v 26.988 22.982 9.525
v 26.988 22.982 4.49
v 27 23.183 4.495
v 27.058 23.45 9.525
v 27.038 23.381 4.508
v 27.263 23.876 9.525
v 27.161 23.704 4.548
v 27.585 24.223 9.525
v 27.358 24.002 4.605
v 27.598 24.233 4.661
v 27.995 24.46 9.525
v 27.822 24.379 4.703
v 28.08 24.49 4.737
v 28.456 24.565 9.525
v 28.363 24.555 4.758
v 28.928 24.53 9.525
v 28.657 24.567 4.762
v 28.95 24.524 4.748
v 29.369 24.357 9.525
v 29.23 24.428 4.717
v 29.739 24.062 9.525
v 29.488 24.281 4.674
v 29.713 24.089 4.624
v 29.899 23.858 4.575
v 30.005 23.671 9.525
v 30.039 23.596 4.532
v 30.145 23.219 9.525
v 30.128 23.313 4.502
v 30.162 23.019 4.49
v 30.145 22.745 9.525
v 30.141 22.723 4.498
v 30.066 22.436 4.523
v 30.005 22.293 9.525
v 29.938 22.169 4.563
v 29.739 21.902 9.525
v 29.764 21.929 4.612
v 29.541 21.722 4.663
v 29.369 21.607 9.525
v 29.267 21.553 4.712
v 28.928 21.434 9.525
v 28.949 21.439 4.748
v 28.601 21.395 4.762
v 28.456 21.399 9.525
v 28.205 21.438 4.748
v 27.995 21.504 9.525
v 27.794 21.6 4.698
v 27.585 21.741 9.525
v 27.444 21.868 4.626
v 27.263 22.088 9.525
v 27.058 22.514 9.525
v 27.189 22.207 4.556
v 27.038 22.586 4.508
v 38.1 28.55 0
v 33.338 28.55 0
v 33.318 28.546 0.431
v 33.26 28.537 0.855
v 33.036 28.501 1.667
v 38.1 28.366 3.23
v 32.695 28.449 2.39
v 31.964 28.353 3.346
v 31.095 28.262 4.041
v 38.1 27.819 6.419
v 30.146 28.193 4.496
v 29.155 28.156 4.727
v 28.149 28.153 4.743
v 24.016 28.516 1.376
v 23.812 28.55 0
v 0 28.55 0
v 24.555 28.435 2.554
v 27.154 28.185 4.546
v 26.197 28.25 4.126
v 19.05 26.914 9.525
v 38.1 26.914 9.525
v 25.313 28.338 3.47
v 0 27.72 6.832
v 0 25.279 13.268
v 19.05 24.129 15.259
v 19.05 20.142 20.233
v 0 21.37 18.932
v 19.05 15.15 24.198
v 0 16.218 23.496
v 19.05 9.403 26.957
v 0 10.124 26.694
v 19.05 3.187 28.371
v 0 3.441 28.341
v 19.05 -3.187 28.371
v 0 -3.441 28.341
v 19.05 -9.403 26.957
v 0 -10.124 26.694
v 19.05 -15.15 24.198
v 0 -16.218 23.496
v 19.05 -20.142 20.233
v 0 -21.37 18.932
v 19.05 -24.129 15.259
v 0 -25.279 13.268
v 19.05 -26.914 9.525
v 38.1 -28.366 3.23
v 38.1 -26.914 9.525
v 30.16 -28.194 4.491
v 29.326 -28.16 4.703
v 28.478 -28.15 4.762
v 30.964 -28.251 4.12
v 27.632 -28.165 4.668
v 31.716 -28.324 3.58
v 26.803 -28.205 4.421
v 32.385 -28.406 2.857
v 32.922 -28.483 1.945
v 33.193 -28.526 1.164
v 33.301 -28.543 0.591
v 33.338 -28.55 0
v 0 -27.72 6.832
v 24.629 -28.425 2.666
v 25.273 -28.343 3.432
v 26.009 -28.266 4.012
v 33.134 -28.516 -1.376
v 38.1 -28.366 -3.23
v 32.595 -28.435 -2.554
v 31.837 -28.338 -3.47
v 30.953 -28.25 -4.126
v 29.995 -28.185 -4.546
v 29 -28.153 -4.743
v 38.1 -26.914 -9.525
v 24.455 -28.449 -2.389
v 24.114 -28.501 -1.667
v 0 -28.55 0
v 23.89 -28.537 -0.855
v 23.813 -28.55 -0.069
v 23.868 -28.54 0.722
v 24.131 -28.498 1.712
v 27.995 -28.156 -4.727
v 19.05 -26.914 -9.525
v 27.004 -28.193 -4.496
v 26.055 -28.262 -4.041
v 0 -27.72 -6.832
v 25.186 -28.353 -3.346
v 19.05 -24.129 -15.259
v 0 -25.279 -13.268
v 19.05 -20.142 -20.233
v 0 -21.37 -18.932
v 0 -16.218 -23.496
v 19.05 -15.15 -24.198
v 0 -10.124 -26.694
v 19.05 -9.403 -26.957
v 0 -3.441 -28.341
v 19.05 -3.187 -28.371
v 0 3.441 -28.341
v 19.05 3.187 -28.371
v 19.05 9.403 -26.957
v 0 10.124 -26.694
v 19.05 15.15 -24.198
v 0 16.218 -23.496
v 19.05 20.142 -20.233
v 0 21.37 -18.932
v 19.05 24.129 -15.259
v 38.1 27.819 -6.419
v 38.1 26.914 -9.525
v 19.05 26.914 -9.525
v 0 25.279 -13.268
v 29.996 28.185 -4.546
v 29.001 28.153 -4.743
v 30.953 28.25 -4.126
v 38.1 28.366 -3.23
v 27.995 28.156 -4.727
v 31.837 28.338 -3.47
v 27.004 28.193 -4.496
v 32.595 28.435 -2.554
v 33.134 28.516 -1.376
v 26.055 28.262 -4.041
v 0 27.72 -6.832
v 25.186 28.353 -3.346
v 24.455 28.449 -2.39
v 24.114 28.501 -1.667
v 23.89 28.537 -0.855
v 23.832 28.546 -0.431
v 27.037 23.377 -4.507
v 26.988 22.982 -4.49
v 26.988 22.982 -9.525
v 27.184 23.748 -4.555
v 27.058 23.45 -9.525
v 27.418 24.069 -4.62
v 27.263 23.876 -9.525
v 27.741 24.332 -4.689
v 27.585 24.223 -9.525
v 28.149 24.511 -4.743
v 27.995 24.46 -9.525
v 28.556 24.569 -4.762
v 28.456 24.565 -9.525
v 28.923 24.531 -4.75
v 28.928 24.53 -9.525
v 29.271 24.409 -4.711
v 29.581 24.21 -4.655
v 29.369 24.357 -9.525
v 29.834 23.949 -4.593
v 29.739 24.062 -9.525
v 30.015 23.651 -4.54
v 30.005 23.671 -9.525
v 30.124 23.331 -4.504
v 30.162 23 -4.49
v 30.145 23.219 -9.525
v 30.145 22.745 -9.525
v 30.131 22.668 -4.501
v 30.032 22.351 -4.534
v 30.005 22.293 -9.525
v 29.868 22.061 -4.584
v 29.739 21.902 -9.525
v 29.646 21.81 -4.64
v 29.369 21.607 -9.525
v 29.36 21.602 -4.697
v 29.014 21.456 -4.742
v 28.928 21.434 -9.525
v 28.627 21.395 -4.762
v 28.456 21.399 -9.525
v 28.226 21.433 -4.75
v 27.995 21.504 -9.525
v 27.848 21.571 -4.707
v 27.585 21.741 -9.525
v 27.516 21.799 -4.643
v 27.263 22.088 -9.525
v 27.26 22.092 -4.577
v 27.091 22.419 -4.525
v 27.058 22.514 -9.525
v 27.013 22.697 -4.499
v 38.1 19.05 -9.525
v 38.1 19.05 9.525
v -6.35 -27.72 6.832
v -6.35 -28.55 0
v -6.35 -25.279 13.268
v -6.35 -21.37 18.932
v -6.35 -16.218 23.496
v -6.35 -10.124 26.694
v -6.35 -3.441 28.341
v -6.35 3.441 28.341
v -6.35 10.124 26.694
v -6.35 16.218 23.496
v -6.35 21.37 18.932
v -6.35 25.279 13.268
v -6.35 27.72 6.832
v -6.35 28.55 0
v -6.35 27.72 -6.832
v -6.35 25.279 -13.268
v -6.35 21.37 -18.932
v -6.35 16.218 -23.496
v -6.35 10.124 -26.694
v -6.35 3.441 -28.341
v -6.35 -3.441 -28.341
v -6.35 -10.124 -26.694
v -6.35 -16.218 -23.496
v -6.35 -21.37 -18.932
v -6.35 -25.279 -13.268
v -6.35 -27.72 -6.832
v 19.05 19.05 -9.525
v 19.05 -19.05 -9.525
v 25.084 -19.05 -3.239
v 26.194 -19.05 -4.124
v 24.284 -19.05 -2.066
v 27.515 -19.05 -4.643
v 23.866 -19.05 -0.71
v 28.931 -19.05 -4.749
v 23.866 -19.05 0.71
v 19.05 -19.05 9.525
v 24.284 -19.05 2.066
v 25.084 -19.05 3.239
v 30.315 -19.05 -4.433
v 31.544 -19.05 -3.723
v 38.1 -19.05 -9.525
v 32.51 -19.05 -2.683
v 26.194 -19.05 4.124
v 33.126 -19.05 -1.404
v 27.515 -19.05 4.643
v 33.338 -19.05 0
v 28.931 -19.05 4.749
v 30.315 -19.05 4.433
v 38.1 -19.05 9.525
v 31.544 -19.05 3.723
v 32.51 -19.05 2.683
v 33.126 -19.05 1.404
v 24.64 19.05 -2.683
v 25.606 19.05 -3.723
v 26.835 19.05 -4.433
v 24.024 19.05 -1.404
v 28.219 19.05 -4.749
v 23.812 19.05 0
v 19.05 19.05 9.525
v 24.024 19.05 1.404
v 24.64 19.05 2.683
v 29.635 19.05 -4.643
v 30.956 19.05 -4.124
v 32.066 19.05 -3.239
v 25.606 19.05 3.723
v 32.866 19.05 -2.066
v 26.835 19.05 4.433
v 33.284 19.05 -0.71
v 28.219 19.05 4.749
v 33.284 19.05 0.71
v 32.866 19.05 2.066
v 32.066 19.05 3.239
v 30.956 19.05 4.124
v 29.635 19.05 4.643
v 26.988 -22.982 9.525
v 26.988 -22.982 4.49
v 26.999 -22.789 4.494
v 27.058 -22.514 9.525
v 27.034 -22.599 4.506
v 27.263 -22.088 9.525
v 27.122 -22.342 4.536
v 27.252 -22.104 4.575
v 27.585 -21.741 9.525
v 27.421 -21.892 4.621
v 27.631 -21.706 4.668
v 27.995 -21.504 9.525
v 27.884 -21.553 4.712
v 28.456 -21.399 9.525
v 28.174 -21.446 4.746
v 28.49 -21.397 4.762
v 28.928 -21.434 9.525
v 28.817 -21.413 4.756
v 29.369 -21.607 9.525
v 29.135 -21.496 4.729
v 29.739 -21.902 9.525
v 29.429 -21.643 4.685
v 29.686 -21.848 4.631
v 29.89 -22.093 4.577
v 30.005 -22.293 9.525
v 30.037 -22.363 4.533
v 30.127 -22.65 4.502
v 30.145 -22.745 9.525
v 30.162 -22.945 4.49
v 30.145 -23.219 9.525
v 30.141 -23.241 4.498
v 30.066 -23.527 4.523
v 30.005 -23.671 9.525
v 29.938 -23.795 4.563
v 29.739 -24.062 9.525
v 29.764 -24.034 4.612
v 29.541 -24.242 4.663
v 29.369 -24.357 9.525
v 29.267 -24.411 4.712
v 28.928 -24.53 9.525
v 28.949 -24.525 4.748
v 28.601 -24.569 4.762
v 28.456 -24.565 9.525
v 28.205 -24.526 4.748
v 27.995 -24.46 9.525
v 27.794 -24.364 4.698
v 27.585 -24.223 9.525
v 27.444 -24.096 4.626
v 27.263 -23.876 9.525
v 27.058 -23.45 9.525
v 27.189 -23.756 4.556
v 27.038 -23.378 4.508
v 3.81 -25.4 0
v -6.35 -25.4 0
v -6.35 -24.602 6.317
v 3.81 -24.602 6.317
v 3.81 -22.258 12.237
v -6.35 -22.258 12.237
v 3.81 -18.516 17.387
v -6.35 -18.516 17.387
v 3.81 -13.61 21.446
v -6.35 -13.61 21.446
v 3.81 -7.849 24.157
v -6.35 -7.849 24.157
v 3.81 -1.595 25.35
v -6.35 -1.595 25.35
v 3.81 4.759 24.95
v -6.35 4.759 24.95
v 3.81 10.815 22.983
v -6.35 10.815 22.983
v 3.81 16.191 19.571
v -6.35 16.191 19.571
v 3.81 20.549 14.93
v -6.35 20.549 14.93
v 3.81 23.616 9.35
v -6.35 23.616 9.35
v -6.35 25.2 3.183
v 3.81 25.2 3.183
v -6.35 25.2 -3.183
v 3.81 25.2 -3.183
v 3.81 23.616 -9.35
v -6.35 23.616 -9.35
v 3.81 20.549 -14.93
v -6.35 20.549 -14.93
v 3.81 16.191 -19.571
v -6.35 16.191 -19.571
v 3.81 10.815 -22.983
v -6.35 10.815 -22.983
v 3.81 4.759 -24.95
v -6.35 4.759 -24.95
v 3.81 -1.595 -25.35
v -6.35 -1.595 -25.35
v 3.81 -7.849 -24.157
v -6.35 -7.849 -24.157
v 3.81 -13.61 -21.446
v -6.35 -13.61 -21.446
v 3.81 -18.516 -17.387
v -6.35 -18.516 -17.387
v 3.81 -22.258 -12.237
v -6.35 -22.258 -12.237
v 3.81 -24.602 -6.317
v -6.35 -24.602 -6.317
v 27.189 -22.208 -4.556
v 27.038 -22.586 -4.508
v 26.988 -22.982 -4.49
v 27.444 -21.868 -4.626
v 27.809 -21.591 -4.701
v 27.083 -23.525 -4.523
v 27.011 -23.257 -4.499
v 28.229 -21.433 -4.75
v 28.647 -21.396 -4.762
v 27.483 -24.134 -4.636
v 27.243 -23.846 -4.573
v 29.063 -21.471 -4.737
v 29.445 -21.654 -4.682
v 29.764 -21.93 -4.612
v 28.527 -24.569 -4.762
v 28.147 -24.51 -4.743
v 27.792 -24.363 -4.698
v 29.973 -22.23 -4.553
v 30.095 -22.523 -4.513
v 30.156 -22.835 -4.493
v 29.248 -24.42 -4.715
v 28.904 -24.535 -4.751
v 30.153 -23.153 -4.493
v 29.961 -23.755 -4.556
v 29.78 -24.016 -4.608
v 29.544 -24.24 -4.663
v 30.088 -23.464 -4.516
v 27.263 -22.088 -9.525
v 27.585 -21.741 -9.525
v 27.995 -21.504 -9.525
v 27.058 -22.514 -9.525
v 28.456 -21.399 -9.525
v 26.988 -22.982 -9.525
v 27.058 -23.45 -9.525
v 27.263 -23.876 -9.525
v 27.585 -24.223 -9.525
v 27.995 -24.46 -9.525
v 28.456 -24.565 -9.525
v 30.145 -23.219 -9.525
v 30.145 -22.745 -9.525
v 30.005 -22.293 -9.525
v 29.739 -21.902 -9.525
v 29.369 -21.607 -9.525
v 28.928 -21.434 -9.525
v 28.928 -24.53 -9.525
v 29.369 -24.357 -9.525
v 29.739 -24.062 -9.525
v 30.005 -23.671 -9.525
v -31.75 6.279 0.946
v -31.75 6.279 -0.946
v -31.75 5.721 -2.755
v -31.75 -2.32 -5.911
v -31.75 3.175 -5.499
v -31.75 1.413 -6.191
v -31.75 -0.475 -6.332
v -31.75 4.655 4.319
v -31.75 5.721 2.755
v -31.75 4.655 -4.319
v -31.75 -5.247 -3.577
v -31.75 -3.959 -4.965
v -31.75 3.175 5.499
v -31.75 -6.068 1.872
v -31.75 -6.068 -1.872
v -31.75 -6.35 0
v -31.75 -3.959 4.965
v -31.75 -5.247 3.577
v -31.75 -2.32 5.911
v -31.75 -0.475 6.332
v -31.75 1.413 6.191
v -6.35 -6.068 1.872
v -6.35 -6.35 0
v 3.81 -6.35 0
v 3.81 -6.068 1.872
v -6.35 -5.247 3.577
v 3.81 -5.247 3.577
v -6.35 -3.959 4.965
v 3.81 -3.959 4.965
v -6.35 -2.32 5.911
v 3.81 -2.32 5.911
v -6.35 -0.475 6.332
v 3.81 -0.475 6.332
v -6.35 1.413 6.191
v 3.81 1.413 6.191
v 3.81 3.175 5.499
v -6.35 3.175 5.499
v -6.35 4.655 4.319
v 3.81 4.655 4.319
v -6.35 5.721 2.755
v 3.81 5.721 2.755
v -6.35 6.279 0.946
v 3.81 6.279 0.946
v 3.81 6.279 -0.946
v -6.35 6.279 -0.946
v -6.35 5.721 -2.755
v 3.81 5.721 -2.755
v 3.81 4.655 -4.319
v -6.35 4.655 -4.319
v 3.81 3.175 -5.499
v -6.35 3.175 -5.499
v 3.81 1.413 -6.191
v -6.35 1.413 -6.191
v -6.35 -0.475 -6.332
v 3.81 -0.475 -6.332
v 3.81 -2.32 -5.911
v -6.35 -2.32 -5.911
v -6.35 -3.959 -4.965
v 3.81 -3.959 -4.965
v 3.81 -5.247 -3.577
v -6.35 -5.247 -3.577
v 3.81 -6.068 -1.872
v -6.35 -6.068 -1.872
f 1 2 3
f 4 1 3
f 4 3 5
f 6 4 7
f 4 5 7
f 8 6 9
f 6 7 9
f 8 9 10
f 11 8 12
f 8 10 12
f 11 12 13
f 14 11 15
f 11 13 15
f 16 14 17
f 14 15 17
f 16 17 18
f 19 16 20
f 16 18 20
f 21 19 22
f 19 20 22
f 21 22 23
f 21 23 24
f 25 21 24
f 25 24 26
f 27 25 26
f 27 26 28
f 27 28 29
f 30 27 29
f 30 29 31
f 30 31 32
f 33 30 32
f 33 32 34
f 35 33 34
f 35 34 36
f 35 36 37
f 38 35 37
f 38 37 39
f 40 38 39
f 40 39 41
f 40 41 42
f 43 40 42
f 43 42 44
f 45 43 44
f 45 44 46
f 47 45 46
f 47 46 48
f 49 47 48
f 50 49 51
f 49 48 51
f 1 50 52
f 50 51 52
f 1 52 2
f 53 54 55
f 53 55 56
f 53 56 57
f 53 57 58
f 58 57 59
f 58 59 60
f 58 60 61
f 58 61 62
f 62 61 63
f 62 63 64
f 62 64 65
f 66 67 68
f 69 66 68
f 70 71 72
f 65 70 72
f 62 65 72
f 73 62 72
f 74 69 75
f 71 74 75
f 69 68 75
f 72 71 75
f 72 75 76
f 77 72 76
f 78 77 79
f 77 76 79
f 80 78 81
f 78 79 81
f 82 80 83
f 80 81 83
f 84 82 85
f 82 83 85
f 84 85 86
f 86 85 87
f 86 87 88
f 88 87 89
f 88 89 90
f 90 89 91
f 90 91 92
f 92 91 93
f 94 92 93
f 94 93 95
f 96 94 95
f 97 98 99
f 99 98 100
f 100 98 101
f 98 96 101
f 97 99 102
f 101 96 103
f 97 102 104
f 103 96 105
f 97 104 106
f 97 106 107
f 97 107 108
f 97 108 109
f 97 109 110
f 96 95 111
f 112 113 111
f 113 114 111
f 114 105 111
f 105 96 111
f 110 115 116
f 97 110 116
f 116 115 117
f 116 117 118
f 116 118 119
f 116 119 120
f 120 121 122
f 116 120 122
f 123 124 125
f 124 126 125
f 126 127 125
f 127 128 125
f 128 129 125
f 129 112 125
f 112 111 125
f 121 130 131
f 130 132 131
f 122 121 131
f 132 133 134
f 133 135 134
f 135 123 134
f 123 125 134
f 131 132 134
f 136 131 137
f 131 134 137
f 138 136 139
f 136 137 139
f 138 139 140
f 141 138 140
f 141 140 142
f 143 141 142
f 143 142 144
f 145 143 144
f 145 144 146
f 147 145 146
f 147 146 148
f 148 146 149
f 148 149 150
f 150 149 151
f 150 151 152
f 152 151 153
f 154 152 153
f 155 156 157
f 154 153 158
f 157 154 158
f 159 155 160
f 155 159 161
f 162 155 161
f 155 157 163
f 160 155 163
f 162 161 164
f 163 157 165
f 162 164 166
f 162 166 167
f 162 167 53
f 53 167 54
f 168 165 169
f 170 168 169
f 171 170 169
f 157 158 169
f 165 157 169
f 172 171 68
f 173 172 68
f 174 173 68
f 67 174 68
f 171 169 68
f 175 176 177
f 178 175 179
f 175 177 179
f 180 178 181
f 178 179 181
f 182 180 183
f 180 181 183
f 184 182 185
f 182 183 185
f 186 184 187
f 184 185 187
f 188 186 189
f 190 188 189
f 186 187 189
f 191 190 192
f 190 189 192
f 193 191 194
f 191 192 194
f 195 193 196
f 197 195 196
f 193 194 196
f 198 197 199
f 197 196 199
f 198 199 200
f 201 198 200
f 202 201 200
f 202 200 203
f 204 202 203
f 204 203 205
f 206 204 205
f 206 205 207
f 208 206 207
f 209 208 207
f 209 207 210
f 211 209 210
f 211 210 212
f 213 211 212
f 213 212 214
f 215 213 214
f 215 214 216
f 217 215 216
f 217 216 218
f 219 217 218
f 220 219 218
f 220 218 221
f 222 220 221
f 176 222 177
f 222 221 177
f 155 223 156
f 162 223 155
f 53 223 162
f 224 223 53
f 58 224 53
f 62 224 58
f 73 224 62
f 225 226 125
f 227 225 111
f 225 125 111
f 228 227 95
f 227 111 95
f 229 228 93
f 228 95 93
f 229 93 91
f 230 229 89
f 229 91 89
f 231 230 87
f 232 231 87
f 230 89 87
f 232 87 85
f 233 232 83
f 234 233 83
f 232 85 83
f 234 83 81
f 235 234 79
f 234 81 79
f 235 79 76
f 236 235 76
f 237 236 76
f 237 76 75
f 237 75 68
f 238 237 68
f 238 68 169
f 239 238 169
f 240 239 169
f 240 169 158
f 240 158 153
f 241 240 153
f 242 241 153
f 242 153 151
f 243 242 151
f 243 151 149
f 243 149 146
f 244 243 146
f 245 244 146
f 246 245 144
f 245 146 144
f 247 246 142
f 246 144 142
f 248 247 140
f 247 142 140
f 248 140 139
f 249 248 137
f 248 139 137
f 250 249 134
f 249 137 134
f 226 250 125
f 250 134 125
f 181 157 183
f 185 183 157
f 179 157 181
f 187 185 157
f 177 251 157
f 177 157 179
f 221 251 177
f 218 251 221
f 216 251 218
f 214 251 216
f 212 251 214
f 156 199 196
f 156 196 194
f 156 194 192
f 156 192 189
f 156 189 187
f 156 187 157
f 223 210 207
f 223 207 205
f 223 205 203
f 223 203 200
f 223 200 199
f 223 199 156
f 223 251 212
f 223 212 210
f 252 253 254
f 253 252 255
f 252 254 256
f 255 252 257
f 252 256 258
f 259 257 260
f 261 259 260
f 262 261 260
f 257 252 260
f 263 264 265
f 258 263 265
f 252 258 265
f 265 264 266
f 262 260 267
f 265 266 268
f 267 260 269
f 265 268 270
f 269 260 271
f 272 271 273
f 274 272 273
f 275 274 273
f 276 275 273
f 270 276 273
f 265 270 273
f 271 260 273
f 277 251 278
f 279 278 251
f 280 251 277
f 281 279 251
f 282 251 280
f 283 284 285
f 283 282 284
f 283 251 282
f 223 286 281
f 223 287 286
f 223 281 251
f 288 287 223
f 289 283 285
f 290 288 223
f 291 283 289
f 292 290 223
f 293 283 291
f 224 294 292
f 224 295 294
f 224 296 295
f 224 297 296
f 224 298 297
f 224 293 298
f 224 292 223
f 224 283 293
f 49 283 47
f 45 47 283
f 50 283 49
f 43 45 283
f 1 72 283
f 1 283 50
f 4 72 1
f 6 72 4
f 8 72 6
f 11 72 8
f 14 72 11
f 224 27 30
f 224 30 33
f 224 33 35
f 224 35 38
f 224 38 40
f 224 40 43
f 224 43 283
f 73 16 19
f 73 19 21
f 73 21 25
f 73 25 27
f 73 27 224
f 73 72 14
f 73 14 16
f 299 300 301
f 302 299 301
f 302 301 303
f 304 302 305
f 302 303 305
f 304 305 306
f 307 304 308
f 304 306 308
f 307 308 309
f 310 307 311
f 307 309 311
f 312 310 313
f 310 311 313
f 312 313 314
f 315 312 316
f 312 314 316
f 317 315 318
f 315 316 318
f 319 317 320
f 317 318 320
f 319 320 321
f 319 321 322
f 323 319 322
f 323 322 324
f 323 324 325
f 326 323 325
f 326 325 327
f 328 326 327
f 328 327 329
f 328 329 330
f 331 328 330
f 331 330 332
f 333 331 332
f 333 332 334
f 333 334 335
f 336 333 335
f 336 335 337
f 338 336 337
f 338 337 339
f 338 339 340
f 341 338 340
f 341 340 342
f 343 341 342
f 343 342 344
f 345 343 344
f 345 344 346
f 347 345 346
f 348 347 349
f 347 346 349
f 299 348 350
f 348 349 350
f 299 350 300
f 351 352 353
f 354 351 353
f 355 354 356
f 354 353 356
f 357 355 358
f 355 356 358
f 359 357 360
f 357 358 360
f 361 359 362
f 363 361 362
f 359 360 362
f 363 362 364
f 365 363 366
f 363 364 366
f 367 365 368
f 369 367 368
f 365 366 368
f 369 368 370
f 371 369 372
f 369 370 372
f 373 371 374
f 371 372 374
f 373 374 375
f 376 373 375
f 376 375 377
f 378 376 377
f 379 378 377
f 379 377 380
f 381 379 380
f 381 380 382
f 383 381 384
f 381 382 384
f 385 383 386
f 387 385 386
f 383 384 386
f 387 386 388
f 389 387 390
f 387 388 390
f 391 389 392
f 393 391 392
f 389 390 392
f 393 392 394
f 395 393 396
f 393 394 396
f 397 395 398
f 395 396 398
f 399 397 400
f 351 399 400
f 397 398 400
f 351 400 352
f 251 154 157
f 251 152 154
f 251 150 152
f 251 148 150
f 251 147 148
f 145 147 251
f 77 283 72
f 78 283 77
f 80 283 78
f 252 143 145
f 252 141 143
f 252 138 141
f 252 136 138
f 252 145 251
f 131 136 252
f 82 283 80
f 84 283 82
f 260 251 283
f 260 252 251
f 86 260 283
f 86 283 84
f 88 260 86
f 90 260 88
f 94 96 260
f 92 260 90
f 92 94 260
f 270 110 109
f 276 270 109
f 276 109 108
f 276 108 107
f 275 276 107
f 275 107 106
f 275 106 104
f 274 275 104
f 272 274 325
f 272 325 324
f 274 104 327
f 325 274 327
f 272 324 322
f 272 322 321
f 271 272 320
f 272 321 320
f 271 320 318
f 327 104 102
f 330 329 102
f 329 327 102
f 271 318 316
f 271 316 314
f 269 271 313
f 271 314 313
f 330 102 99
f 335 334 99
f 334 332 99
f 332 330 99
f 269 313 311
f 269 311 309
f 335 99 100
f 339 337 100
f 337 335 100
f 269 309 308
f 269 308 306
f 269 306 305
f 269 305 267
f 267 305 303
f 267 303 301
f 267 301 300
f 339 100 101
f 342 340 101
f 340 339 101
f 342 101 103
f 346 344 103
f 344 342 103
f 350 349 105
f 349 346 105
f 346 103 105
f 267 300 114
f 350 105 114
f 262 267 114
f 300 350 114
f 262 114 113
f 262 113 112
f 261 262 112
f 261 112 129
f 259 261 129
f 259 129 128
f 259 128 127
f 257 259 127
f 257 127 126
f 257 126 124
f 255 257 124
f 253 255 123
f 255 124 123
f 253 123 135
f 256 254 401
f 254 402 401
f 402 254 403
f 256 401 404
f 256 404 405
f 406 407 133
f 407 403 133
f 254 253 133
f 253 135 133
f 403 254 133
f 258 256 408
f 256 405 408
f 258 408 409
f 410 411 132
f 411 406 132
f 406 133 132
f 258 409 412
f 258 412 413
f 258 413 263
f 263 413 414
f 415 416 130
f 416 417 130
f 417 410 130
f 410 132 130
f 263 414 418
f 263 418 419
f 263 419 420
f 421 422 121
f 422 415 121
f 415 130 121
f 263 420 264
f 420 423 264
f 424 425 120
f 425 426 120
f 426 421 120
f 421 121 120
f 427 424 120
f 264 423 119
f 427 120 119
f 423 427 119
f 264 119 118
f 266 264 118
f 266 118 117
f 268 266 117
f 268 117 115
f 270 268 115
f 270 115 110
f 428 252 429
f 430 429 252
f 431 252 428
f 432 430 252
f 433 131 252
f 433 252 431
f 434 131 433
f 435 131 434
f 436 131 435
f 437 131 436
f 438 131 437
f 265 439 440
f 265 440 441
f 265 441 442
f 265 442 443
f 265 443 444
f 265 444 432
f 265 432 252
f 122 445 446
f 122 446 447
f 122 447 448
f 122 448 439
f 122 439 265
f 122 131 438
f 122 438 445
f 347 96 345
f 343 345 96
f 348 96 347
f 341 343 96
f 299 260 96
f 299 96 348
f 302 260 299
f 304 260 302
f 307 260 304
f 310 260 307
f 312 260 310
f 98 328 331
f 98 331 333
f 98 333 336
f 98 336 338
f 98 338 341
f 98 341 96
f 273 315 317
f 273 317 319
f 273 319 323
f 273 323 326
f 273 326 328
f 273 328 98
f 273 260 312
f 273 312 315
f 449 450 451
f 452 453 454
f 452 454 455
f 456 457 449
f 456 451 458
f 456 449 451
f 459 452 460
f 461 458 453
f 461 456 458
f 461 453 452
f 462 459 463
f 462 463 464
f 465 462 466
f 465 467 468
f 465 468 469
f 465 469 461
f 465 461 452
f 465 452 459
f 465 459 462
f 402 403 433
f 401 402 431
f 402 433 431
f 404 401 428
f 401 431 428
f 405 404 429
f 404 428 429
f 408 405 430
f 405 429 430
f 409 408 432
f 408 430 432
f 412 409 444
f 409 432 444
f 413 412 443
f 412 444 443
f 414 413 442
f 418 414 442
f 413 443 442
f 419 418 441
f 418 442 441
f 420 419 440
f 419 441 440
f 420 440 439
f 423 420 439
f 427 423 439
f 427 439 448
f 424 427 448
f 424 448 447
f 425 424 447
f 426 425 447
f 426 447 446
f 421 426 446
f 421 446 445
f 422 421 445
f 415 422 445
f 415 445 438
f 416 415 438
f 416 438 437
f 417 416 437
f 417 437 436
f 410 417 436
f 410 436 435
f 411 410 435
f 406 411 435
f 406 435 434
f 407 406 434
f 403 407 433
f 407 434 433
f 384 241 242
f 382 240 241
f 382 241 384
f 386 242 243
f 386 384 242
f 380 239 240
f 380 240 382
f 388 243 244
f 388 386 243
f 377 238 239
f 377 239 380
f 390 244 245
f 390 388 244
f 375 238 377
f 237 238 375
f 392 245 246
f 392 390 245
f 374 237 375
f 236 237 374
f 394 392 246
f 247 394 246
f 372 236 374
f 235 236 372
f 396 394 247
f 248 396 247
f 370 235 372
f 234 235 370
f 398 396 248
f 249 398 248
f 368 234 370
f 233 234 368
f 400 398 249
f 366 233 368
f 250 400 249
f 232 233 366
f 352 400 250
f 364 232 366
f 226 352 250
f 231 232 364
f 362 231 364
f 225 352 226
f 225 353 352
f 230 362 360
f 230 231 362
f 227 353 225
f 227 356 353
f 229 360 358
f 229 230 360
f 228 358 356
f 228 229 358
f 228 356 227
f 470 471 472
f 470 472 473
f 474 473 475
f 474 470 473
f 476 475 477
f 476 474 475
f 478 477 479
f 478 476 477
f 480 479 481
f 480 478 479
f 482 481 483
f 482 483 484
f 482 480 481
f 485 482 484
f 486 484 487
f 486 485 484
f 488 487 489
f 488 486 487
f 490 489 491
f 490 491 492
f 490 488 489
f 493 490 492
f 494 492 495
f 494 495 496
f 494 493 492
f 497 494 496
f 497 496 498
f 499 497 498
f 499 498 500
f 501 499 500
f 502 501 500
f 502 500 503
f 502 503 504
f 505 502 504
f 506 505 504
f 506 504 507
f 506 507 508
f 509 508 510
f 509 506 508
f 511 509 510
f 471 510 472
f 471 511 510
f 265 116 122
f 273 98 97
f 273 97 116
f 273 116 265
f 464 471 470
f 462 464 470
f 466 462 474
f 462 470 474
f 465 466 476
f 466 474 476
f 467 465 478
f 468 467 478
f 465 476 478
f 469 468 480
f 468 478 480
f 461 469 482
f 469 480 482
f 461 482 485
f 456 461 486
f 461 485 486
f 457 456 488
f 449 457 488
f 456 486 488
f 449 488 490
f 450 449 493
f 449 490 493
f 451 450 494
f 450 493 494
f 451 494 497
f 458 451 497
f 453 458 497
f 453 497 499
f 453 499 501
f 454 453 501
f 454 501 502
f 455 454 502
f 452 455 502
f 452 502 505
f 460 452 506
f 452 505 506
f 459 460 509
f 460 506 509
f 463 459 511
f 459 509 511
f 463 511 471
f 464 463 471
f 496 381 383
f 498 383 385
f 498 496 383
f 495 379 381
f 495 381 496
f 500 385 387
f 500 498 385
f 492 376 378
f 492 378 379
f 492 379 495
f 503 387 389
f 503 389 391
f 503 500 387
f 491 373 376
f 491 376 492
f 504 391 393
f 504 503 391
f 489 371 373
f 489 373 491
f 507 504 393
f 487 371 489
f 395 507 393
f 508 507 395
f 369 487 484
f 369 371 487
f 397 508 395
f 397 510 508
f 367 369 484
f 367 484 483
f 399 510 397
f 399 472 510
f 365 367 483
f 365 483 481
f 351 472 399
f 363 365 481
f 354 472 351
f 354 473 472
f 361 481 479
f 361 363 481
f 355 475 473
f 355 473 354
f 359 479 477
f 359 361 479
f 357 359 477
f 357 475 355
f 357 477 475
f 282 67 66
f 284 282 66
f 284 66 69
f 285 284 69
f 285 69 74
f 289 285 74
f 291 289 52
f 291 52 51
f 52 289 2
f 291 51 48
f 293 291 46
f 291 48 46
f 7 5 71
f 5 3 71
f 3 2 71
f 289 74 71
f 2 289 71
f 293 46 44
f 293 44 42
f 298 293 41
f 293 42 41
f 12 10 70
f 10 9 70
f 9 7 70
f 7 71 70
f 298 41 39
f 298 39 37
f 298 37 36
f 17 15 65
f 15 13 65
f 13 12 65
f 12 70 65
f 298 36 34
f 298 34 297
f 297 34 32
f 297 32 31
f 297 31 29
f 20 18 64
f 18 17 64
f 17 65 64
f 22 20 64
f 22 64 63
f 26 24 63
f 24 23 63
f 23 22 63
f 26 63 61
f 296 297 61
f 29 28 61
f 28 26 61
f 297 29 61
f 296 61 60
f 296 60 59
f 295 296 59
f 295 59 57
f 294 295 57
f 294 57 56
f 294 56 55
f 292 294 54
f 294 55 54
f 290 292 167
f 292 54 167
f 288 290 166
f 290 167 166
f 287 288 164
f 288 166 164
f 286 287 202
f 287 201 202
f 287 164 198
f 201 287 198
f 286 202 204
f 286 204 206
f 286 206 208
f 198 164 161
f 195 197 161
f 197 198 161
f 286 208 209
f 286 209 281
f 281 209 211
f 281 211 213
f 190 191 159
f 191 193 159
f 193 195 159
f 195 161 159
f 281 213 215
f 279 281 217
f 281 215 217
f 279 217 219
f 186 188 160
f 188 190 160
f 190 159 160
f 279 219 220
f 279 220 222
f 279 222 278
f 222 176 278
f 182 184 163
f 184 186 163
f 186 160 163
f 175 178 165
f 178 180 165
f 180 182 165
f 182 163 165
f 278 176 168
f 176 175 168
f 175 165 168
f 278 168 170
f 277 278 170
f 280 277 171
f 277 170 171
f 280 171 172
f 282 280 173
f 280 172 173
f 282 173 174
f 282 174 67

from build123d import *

# Parameters (mm, degrees)
F0_R                   = 28.5496
F1_DEPTH               = 38.1
F2_W                   = 20.32
F2_H                   = 22.1844250173
F2_H_2                 = 21.4777487576
F3_DEPTH               = 38.1
F3_DEPTH_BACK          = 38.1
F4_W                   = 45.6145062673
F4_H                   = 38.1
F5_DEPTH               = 25.4
F5_DEPTH_BACK          = 25.4
F7_D                   = 9.525
F7_DEPTH               = 25.4
F7_CBORE_D             = 9.525
F7_CBORE_DEPTH         = 6.35
F7_TIP                 = 2.8615986981
F9_D                   = 9.525
F9_DEPTH               = 25.4
F9_CBORE_D             = 9.525
F9_CBORE_DEPTH         = 6.35
F9_TIP                 = 2.8615986981
F12_D                  = 3.175
F12_DEPTH              = 25.4
F12_CBORE_D            = 3.175
F12_CBORE_DEPTH        = 6.35
F12_TIP                = 0.9538662327
F12_ON_F11_D           = 3.175
F12_ON_F11_DEPTH       = 25.4
F12_ON_F11_CBORE_D     = 3.175
F12_ON_F11_CBORE_DEPTH = 6.35
F12_ON_F11_TIP         = 0.9538662327
F13_R                  = 28.5496
F14_DEPTH              = 6.35
F15_R                  = 6.35
F16_DEPTH              = 25.4
F17_R                  = 25.4
F17_R_2                = 6.35
F18_DEPTH              = 10.16


with BuildPart() as f1:
    # F0 (on Right) → F1 (new body)
    with BuildSketch(Plane.YZ):
        Circle(F0_R)
    extrude(amount=F1_DEPTH)

    # F2 (on Front) → F3 (cut, two sides)
    with BuildSketch(Plane.XZ) as f3_sk:
        with Locations((29.21, 20.6172125086)):
            Rectangle(F2_W, F2_H)
        with Locations((29.21, -20.2638743788)):
            Rectangle(F2_W, F2_H_2)
    extrude(amount=-F3_DEPTH, mode=Mode.SUBTRACT)
    extrude(f3_sk.sketch, amount=F3_DEPTH_BACK, mode=Mode.SUBTRACT)

    # F4 (on Top) → F5 (cut, two sides)
    with BuildSketch(Plane.XY) as f5_sk:
        with Locations((41.8572531337, 0)):
            Rectangle(F4_W, F4_H)
    extrude(amount=-F5_DEPTH, mode=Mode.SUBTRACT)
    extrude(f5_sk.sketch, amount=F5_DEPTH_BACK, mode=Mode.SUBTRACT)

    # F7
    with Locations(Plane.XZ.offset(-19.05)):
        with Locations((28.575, 0)):
            CounterBoreHole(F7_D / 2, F7_CBORE_D / 2, F7_CBORE_DEPTH, depth=F7_DEPTH)
            with Locations((0, 0, -(F7_DEPTH + F7_TIP / 2))):  # 118° drill point
                Cone(0, F7_D / 2, F7_TIP, mode=Mode.SUBTRACT)

    # F9
    with Locations(Plane(origin=(0, -19.05, 0), x_dir=(-1, 0, 0), z_dir=(0, 1, 0))):
        with Locations((-28.575, 0)):
            CounterBoreHole(F9_D / 2, F9_CBORE_D / 2, F9_CBORE_DEPTH, depth=F9_DEPTH)
            with Locations((0, 0, -(F9_DEPTH + F9_TIP / 2))):  # 118° drill point
                Cone(0, F9_D / 2, F9_TIP, mode=Mode.SUBTRACT)

    # F12
    with Locations(Plane.XY.offset(9.525)):
        with Locations((28.575, 22.9819130483)):
            CounterBoreHole(F12_D / 2, F12_CBORE_D / 2, F12_CBORE_DEPTH, depth=F12_DEPTH)
            with Locations((0, 0, -(F12_DEPTH + F12_TIP / 2))):  # 118° drill point
                Cone(0, F12_D / 2, F12_TIP, mode=Mode.SUBTRACT)

    # F12 on F11
    with Locations(Plane.XY.offset(9.525)):
        with Locations((28.575, -22.9819130483)):
            CounterBoreHole(F12_ON_F11_D / 2, F12_ON_F11_CBORE_D / 2, F12_ON_F11_CBORE_DEPTH, depth=F12_ON_F11_DEPTH)
            with Locations((0, 0, -(F12_ON_F11_DEPTH + F12_ON_F11_TIP / 2))):  # 118° drill point
                Cone(0, F12_ON_F11_D / 2, F12_ON_F11_TIP, mode=Mode.SUBTRACT)

    # F13 (on face) → F14 (join)
    with BuildSketch(Plane(origin=(0, 0, 0), x_dir=(0, -1, 0), z_dir=(-1, 0, 0))):
        Circle(F13_R)
    extrude(amount=F14_DEPTH)

    # F15 (on face) → F16 (join)
    with BuildSketch(Plane(origin=(-6.35, 0, 0), x_dir=(0, -1, 0), z_dir=(-1, 0, 0))):
        Circle(F15_R)
    extrude(amount=F16_DEPTH)

    # F17 (on face) → F18 (cut)
    with BuildSketch(Plane(origin=(-6.35, 0, 0), x_dir=(0, -1, 0), z_dir=(-1, 0, 0))):
        Circle(F17_R)
        Circle(F17_R_2, mode=Mode.SUBTRACT)
    extrude(amount=-F18_DEPTH, mode=Mode.SUBTRACT)


solid = f1.part
